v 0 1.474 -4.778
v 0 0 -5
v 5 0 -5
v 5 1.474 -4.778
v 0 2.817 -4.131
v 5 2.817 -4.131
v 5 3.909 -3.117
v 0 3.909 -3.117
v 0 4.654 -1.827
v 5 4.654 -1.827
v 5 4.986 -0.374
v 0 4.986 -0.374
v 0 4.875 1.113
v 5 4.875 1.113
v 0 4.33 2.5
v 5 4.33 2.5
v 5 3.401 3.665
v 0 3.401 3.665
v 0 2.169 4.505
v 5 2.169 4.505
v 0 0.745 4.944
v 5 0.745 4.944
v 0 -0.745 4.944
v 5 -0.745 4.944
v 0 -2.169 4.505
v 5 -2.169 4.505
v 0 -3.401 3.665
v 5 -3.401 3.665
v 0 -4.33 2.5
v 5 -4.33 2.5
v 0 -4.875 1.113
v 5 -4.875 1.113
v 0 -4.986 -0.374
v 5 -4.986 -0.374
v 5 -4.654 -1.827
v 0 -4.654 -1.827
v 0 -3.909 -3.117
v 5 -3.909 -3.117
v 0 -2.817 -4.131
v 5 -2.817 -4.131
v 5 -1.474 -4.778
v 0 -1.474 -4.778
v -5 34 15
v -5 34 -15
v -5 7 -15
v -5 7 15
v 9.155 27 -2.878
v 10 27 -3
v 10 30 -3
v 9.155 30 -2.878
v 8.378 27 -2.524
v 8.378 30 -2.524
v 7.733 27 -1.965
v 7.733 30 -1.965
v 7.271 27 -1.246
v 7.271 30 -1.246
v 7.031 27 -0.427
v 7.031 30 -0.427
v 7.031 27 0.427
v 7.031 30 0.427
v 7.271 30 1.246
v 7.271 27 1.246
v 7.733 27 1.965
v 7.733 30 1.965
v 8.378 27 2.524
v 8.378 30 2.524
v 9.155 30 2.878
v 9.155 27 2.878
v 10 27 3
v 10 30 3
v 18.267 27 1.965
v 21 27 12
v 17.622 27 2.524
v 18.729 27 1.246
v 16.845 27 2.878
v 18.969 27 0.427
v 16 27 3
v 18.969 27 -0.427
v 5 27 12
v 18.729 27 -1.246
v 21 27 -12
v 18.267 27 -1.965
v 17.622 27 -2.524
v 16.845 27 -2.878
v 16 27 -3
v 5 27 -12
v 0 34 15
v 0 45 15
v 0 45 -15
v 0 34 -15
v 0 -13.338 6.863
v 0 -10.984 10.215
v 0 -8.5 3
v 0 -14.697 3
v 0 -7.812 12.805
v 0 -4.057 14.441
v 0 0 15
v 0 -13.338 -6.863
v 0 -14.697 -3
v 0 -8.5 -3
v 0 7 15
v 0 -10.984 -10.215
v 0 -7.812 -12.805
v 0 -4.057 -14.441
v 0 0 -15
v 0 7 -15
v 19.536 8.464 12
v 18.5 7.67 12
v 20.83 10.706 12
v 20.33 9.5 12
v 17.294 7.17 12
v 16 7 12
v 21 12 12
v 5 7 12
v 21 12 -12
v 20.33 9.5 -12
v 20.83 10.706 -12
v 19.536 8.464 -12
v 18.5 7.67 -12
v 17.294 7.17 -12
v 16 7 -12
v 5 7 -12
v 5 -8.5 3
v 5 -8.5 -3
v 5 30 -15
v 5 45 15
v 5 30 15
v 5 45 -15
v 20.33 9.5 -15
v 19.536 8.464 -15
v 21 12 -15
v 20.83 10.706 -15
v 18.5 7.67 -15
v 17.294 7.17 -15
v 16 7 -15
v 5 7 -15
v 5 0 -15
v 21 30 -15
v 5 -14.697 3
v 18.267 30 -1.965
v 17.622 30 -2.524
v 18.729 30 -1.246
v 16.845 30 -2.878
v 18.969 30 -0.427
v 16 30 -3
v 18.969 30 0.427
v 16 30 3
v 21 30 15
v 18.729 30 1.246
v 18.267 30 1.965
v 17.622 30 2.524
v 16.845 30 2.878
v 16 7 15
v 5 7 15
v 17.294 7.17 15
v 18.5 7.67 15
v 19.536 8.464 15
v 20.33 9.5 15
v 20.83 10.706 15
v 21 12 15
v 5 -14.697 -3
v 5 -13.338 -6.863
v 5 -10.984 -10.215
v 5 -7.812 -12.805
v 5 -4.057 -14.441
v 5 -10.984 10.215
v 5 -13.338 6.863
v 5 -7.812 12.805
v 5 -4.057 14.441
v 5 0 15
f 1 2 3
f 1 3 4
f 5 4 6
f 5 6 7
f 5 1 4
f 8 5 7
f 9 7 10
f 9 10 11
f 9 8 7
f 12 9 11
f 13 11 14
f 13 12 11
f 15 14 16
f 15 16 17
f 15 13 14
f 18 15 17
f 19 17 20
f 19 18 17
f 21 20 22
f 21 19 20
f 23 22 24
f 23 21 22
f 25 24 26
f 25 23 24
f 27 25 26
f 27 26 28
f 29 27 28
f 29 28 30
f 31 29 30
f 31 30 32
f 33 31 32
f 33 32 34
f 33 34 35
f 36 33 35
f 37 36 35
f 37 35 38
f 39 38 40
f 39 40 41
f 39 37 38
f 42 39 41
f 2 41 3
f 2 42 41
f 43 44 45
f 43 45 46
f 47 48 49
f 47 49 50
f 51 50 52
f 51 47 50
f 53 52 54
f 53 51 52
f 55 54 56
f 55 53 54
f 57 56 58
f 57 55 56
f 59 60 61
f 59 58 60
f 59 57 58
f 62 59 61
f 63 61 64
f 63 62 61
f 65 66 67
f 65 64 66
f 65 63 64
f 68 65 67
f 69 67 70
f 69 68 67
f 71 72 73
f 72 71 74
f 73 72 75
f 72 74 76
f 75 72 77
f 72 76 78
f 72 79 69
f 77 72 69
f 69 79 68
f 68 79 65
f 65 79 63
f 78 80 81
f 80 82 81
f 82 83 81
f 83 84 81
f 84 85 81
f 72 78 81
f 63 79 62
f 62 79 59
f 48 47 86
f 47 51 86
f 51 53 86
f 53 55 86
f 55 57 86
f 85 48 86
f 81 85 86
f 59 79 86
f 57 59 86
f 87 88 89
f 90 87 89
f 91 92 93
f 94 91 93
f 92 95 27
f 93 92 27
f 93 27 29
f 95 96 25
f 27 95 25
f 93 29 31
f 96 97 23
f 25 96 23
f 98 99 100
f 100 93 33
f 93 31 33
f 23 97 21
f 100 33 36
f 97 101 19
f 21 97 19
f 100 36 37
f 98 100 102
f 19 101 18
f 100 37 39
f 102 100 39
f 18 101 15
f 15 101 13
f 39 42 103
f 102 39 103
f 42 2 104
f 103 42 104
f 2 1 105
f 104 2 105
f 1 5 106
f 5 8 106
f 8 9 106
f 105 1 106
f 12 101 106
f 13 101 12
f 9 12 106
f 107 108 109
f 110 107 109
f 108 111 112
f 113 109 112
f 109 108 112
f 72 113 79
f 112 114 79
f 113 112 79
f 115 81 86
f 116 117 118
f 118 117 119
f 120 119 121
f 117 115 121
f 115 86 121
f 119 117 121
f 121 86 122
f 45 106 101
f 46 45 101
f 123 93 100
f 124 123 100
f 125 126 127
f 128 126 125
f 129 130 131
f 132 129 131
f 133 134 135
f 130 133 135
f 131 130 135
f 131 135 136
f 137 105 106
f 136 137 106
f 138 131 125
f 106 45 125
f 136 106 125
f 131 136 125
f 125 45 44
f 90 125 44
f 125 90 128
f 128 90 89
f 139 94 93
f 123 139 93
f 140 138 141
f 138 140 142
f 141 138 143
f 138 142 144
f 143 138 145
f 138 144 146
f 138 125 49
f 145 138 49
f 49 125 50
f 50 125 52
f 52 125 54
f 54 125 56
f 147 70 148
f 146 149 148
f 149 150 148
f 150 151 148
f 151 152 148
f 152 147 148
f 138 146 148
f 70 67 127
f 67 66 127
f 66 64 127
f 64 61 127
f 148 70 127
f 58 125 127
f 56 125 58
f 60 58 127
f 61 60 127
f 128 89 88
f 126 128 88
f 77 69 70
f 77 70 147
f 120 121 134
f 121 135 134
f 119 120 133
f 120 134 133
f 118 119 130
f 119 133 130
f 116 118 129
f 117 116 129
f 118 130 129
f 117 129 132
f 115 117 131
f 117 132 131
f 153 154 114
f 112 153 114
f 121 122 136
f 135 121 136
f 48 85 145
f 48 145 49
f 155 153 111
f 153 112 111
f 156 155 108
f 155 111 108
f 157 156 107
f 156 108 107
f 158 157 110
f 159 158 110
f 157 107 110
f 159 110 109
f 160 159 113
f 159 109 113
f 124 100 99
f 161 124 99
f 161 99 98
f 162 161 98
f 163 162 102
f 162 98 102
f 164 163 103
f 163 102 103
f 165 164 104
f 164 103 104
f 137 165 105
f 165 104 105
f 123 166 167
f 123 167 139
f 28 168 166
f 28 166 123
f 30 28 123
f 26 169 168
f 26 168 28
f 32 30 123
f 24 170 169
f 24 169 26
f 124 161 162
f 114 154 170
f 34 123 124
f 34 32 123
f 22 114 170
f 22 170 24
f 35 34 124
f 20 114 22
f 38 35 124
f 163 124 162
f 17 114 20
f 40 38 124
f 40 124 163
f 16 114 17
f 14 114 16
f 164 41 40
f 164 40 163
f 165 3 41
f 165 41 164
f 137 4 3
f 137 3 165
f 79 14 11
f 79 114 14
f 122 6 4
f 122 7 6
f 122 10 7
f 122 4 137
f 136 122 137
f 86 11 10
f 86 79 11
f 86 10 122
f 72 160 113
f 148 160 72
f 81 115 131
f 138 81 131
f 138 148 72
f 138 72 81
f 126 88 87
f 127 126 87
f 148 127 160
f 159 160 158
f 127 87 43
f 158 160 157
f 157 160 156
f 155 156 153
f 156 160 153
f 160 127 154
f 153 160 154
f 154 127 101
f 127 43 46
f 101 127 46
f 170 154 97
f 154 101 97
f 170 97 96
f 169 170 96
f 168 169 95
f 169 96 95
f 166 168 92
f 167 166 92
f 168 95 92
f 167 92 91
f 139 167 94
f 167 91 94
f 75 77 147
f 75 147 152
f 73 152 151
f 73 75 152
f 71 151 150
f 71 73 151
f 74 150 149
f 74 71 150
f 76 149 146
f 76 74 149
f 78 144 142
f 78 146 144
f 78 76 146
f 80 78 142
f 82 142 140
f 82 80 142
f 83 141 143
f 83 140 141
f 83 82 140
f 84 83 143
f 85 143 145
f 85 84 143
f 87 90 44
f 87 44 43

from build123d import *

# Parameters (mm, degrees)
SKETCH_1_R          = 5
EXTRUDE_1_DEPTH     = 5
EXTRUDE_2_DEPTH     = 21
FILLET_1_R          = 5
SKETCH_3_W          = 30
SKETCH_3_H          = 27
EXTRUDE_3_DEPTH     = 5
CUT_EXTRUDE_1_DEPTH = 50.037074512


with BuildPart() as part:
    # Эскиз1 → Бобышка-Вытянуть1 (new body)
    with BuildSketch(Plane(origin=(0, 0, 0), x_dir=(0, 0, -1), z_dir=(1, 0, 0))):
        with BuildLine():
            ThreePointArc((-15, 0), (-11.618950039, -9.486832981), (-3, -14.696938457))
            Line((-3, -14.696938457), (-3, -8.5))
            Line((-3, -8.5), (3, -8.5))
            Line((3, -8.5), (3, -14.696938457))
            ThreePointArc((3, -14.696938457), (11.618950039, -9.486832981), (15, 0))
            Line((15, 0), (15, 45))
            Line((15, 45), (-15, 45))
            Line((-15, 45), (-15, 0))
        make_face()
        Circle(SKETCH_1_R, mode=Mode.SUBTRACT)
    extrude(amount=EXTRUDE_1_DEPTH)

    # Эскиз1<4> → Бобышка-Вытянуть2 (add)
    with BuildSketch(Plane(origin=(0, 0, 0), x_dir=(0, 0, -1), z_dir=(1, 0, 0))):
        Polygon((-15, 30), (-15, 7), (-12, 7), (-12, 27), (12, 27), (12, 7), (15, 7), (15, 30), align=None)
    extrude(amount=EXTRUDE_2_DEPTH)

    # Скругление1
    fillet_1_edges = [part.edges().sort_by_distance(p)[0] for p in [
        (21, 7, 13.5),
        (21, 7, -13.5),
    ]]
    fillet(fillet_1_edges, radius=FILLET_1_R)

    # Эскиз3 → Бобышка-Вытянуть3 (add)
    with BuildSketch(Plane.ZY):
        with Locations((0, 20.5)):
            Rectangle(SKETCH_3_W, SKETCH_3_H)
    extrude(amount=EXTRUDE_3_DEPTH)

    # Эскиз4 → Вырез-Вытянуть1 (cut, through all)
    with BuildSketch(Plane.XZ.offset(-27)):
        with BuildLine():
            Line((10, 3), (16, 3))
            ThreePointArc((16, 3), (19, 0), (16, -3))
            Line((16, -3), (10, -3))
            ThreePointArc((10, -3), (7, 0), (10, 3))
        make_face()
    extrude(amount=-CUT_EXTRUDE_1_DEPTH, mode=Mode.SUBTRACT)


solid = part.part
